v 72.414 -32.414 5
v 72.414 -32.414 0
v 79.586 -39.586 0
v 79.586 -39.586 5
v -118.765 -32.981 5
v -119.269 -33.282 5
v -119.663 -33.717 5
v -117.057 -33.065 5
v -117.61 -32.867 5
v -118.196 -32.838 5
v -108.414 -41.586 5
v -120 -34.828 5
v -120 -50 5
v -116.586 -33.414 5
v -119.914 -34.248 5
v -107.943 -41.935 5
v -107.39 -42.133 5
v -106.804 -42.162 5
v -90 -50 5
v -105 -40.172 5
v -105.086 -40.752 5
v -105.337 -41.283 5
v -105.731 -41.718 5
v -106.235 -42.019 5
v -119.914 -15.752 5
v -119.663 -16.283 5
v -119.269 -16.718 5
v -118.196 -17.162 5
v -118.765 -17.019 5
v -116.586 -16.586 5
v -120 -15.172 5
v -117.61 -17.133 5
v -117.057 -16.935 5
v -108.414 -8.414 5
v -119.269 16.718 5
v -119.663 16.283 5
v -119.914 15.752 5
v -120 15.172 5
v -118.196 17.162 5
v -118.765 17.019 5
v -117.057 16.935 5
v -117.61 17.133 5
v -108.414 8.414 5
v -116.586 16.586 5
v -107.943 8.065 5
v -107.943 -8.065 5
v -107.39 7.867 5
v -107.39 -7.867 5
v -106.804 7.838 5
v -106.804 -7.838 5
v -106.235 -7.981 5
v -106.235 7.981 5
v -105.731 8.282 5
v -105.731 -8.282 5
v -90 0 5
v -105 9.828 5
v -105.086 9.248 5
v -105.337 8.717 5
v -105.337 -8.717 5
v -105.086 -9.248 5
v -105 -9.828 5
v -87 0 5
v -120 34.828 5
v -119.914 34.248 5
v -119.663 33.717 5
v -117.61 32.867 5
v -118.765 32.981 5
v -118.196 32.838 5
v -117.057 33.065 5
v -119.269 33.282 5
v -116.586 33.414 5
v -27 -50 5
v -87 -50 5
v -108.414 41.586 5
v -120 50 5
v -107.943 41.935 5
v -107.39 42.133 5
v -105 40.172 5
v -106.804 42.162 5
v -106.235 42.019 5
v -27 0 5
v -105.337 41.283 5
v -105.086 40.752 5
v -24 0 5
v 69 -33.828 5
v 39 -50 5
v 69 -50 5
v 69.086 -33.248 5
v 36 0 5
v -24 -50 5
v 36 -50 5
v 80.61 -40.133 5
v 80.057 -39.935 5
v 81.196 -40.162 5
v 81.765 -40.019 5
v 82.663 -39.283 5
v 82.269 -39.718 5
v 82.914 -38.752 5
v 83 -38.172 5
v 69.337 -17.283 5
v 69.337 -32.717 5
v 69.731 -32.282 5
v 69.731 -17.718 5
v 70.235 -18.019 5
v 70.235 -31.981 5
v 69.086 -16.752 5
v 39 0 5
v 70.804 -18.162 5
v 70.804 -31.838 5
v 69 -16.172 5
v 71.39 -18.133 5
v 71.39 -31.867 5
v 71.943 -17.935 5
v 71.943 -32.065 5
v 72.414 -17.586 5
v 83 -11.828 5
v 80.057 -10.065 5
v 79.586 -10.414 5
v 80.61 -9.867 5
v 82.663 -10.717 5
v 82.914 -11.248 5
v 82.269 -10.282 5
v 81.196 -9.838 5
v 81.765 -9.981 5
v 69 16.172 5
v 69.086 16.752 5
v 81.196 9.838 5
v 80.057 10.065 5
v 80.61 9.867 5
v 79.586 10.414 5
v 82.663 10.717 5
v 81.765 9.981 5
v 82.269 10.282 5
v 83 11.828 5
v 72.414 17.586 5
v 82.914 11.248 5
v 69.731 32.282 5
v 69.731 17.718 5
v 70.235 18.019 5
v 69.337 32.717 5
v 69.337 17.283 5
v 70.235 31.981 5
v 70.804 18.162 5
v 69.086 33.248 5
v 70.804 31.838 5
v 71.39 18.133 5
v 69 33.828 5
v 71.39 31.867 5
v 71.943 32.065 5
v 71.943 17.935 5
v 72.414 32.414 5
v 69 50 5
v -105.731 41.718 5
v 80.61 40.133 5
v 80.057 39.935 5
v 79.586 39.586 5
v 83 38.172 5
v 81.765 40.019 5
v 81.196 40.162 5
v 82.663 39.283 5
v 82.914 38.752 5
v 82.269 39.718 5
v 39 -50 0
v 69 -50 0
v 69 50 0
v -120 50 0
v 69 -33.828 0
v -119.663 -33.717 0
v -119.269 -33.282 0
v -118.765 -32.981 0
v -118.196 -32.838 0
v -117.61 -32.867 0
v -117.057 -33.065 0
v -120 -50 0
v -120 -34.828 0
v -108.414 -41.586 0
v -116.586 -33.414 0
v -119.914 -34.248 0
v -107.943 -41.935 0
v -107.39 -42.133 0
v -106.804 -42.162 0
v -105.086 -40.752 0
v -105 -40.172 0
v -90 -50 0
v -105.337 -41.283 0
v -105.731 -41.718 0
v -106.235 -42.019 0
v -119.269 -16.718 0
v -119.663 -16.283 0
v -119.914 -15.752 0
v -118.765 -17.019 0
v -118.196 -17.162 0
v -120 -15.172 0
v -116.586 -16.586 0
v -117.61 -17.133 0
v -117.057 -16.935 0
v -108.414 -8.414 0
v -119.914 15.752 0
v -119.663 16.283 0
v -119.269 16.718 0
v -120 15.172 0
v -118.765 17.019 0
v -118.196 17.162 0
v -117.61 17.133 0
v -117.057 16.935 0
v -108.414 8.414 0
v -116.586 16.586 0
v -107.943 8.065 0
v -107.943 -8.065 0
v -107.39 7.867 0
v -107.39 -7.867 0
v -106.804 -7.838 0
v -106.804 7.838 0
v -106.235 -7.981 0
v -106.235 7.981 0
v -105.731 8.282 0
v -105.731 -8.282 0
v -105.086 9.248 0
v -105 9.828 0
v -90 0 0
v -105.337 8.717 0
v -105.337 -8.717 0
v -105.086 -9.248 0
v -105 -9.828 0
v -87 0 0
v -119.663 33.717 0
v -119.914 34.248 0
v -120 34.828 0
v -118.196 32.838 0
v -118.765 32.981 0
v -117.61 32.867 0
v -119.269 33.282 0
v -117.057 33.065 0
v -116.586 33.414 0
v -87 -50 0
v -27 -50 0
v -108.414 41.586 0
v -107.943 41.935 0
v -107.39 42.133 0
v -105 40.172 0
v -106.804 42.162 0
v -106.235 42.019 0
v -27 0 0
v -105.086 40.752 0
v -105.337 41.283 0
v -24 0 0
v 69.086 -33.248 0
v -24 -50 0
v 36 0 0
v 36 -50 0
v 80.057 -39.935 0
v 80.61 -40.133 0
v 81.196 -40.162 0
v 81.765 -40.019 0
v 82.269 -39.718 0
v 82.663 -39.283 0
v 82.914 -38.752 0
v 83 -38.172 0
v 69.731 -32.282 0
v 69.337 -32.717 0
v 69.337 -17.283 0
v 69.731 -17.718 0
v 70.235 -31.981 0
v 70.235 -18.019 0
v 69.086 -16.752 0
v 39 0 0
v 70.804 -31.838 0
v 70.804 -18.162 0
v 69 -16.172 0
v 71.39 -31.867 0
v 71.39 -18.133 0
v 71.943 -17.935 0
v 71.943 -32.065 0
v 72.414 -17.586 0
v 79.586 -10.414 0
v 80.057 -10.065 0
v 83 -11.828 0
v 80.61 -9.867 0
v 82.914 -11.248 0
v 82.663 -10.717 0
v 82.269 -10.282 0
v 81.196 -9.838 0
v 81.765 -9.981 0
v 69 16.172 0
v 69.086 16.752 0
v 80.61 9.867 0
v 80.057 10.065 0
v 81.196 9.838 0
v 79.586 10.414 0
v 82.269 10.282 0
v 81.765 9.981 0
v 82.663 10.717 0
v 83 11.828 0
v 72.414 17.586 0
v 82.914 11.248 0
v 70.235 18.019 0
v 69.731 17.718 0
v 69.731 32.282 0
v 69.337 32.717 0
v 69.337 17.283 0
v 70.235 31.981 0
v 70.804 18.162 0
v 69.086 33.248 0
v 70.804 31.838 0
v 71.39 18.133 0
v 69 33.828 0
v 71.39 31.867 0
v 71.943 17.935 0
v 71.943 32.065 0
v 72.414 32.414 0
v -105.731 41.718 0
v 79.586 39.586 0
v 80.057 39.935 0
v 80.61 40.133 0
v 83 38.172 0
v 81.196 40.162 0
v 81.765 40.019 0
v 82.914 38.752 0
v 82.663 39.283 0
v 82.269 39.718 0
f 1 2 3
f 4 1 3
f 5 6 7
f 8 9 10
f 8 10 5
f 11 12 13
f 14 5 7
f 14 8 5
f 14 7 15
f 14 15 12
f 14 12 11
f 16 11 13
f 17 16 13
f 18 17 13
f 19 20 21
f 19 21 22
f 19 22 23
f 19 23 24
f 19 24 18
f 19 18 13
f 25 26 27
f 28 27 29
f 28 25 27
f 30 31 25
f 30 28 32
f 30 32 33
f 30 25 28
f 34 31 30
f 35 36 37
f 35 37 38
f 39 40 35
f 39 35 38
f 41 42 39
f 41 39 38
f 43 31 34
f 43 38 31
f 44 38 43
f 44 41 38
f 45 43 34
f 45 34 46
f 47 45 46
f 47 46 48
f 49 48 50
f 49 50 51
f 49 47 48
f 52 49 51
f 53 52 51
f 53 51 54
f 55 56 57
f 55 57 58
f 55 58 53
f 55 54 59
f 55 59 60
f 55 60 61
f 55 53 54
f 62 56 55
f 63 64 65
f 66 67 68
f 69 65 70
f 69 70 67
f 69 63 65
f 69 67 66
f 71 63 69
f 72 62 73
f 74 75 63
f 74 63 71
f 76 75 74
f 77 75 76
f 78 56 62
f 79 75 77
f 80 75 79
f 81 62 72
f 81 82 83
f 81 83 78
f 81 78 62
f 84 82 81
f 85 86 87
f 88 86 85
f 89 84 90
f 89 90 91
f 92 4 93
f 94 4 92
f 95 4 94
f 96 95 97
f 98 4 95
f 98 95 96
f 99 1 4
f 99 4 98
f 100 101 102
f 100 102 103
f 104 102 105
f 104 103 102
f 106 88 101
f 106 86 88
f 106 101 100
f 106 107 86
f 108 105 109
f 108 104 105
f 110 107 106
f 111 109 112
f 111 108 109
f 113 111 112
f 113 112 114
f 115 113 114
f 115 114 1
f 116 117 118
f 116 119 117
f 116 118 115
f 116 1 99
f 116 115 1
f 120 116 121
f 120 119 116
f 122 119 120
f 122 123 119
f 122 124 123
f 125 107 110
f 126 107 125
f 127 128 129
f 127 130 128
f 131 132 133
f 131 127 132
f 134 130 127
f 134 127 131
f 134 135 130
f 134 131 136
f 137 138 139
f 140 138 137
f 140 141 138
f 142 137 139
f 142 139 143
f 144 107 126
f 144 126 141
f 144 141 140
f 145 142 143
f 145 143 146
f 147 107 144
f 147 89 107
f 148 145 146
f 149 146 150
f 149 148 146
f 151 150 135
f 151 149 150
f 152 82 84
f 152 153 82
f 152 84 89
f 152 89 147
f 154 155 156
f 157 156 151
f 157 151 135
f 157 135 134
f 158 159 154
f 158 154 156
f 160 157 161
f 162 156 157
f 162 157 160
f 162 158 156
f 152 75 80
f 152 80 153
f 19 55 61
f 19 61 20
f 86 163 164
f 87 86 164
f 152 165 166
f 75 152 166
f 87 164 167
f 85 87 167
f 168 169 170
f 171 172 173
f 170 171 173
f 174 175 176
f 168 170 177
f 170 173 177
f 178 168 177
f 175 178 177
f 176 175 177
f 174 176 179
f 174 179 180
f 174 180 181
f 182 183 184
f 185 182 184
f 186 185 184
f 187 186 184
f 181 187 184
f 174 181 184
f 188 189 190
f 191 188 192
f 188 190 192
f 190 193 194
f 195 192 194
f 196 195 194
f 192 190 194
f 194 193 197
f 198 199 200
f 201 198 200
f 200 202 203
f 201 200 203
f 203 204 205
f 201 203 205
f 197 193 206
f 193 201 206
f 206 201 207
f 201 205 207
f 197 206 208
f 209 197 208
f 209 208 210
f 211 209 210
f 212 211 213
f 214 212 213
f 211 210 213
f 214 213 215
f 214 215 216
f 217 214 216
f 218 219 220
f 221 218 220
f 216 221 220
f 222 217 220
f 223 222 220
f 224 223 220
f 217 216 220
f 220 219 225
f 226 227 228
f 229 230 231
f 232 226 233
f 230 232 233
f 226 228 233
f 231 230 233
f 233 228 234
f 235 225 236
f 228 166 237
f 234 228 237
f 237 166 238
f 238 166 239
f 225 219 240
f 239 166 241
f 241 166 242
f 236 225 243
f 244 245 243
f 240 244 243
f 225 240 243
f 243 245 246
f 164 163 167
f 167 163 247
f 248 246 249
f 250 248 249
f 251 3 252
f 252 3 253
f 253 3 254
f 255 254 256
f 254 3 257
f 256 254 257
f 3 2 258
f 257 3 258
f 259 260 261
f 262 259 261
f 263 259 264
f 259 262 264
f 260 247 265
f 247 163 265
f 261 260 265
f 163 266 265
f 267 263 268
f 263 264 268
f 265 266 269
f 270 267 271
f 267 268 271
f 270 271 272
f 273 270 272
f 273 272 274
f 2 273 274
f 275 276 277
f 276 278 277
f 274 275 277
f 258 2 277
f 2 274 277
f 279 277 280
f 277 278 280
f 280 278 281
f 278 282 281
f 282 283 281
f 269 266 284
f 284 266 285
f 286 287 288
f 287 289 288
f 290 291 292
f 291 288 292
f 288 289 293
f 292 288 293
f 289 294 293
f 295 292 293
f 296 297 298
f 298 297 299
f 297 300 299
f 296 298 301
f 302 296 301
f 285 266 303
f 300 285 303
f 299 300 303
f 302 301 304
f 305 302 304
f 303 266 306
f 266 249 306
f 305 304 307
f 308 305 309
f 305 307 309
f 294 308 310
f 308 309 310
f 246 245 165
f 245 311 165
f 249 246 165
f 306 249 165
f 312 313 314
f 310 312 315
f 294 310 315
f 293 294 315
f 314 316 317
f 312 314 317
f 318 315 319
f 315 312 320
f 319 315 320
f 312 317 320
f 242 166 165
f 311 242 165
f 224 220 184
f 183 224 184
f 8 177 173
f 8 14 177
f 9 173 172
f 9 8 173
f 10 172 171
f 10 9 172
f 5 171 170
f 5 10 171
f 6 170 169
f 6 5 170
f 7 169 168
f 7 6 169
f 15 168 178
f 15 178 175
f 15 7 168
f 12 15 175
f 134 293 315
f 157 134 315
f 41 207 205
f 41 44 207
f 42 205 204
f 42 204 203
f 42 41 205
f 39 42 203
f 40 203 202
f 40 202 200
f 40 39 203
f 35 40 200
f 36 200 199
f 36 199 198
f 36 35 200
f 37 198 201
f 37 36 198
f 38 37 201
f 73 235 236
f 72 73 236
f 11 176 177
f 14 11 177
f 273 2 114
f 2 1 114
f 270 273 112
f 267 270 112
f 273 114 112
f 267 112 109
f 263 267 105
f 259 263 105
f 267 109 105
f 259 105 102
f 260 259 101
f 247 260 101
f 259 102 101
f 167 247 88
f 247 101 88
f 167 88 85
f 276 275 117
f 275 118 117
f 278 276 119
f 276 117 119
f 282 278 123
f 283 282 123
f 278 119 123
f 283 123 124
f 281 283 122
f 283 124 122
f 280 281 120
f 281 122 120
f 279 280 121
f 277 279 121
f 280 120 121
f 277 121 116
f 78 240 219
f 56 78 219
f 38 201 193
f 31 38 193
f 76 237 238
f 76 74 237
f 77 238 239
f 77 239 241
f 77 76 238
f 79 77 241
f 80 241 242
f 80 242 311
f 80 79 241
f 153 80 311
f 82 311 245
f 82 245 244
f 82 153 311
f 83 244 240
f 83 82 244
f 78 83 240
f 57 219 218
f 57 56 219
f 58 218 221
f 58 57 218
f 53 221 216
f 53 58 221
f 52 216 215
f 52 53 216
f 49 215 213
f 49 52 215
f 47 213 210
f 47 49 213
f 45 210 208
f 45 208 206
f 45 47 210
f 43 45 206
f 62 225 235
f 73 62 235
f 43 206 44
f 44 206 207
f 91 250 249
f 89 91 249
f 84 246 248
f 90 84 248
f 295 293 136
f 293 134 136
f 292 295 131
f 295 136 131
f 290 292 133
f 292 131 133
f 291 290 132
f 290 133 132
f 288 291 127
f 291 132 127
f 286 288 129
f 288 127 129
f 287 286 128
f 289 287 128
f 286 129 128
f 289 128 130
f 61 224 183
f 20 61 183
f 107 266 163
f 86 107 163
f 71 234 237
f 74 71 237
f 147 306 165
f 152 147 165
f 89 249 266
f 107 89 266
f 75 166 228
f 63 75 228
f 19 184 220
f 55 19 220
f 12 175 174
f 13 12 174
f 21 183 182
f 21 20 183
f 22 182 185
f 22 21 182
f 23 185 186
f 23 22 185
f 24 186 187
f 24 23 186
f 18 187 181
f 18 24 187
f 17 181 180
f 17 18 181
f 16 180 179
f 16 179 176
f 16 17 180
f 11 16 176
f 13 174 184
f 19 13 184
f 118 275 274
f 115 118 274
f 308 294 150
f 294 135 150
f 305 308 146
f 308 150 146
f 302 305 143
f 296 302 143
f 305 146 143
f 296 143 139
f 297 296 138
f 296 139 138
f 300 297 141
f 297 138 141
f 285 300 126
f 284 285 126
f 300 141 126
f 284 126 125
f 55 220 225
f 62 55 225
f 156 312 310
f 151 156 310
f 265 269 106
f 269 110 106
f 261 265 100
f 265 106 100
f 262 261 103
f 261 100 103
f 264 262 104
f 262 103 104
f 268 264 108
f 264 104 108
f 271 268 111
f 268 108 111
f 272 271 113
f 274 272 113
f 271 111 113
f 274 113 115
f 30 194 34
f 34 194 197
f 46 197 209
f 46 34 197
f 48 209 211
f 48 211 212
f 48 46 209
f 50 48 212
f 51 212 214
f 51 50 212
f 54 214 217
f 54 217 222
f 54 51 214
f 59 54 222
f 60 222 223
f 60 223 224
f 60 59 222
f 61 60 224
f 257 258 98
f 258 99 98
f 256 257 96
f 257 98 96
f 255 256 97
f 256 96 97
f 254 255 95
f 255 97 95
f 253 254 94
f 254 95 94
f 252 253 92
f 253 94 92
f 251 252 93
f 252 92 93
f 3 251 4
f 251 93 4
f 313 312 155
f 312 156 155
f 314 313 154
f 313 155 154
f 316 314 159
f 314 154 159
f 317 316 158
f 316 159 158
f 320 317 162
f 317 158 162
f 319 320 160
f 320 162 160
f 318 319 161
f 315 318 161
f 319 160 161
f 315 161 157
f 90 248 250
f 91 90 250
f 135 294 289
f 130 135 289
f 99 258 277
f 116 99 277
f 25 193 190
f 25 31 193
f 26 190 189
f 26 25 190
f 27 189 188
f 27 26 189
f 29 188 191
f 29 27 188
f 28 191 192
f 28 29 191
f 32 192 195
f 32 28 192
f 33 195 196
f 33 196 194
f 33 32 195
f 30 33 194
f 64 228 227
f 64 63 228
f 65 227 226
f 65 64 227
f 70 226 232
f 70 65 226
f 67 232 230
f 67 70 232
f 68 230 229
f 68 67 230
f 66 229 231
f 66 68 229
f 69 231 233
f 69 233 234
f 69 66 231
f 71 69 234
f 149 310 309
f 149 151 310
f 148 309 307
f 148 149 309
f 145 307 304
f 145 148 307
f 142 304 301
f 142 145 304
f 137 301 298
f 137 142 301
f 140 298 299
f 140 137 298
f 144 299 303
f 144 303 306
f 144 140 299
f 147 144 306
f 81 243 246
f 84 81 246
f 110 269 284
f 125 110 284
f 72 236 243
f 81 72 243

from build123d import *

# Parameters (mm, degrees)
F1_DEPTH = 5
F2_R     = 2
F3_R     = 2
F4_R     = 2


with BuildPart() as f1:
    # F0 (on Top) → F1 (new body)
    with BuildSketch(Plane.XY):
        Polygon((69, 30), (69, 50), (-120, 50), (-120, 30), (-105, 45), (-105, 25), (-105, 5), (-120, 20), (-120, 0), (-120, -20), (-105, -5), (-105, -25), (-105, -45), (-120, -30), (-120, -50), (-90, -50), (-90, 0), (-87, 0), (-87, -50), (-27, -50), (-27, 0), (-24, 0), (-24, -50), (36, -50), (36, 0), (39, 0), (39, -50), (69, -50), (69, -30), (69, -29), (83.000012, -43.000012), (83.000012, -6.999988), (69, -21), (69, -20), (69, 0), (69, 20), (69, 21), (83.000012, 6.999988), (83.000012, 25), (83.000012, 43.000012), (69, 29), align=None)
    extrude(amount=F1_DEPTH)

    # F2
    f2_edges = [f1.edges().sort_by_distance(p)[0] for p in [
        (-105, 45, 2.5),
        (-105, 5, 2.5),
        (-105, -5, 2.5),
        (-105, -45, 2.5),
        (-120, -20, 2.5),
        (-120, -30, 2.5),
        (-120, 20, 2.5),
        (-120, 30, 2.5),
    ]]
    fillet(f2_edges, radius=F2_R)

    # F3
    f3_edges = [f1.edges().sort_by_distance(p)[0] for p in [
        (83.000012, 43.000012, 2.5),
        (83.000012, 6.999988, 2.5),
        (83.000012, -6.999988, 2.5),
        (83.000012, -43.000012, 2.5),
    ]]
    fillet(f3_edges, radius=F3_R)

    # F4
    f4_edges = [f1.edges().sort_by_distance(p)[0] for p in [
        (69, 21, 2.5),
        (69, 29, 2.5),
        (69, -21, 2.5),
        (69, -29, 2.5),
    ]]
    fillet(f4_edges, radius=F4_R)


solid = f1.part
